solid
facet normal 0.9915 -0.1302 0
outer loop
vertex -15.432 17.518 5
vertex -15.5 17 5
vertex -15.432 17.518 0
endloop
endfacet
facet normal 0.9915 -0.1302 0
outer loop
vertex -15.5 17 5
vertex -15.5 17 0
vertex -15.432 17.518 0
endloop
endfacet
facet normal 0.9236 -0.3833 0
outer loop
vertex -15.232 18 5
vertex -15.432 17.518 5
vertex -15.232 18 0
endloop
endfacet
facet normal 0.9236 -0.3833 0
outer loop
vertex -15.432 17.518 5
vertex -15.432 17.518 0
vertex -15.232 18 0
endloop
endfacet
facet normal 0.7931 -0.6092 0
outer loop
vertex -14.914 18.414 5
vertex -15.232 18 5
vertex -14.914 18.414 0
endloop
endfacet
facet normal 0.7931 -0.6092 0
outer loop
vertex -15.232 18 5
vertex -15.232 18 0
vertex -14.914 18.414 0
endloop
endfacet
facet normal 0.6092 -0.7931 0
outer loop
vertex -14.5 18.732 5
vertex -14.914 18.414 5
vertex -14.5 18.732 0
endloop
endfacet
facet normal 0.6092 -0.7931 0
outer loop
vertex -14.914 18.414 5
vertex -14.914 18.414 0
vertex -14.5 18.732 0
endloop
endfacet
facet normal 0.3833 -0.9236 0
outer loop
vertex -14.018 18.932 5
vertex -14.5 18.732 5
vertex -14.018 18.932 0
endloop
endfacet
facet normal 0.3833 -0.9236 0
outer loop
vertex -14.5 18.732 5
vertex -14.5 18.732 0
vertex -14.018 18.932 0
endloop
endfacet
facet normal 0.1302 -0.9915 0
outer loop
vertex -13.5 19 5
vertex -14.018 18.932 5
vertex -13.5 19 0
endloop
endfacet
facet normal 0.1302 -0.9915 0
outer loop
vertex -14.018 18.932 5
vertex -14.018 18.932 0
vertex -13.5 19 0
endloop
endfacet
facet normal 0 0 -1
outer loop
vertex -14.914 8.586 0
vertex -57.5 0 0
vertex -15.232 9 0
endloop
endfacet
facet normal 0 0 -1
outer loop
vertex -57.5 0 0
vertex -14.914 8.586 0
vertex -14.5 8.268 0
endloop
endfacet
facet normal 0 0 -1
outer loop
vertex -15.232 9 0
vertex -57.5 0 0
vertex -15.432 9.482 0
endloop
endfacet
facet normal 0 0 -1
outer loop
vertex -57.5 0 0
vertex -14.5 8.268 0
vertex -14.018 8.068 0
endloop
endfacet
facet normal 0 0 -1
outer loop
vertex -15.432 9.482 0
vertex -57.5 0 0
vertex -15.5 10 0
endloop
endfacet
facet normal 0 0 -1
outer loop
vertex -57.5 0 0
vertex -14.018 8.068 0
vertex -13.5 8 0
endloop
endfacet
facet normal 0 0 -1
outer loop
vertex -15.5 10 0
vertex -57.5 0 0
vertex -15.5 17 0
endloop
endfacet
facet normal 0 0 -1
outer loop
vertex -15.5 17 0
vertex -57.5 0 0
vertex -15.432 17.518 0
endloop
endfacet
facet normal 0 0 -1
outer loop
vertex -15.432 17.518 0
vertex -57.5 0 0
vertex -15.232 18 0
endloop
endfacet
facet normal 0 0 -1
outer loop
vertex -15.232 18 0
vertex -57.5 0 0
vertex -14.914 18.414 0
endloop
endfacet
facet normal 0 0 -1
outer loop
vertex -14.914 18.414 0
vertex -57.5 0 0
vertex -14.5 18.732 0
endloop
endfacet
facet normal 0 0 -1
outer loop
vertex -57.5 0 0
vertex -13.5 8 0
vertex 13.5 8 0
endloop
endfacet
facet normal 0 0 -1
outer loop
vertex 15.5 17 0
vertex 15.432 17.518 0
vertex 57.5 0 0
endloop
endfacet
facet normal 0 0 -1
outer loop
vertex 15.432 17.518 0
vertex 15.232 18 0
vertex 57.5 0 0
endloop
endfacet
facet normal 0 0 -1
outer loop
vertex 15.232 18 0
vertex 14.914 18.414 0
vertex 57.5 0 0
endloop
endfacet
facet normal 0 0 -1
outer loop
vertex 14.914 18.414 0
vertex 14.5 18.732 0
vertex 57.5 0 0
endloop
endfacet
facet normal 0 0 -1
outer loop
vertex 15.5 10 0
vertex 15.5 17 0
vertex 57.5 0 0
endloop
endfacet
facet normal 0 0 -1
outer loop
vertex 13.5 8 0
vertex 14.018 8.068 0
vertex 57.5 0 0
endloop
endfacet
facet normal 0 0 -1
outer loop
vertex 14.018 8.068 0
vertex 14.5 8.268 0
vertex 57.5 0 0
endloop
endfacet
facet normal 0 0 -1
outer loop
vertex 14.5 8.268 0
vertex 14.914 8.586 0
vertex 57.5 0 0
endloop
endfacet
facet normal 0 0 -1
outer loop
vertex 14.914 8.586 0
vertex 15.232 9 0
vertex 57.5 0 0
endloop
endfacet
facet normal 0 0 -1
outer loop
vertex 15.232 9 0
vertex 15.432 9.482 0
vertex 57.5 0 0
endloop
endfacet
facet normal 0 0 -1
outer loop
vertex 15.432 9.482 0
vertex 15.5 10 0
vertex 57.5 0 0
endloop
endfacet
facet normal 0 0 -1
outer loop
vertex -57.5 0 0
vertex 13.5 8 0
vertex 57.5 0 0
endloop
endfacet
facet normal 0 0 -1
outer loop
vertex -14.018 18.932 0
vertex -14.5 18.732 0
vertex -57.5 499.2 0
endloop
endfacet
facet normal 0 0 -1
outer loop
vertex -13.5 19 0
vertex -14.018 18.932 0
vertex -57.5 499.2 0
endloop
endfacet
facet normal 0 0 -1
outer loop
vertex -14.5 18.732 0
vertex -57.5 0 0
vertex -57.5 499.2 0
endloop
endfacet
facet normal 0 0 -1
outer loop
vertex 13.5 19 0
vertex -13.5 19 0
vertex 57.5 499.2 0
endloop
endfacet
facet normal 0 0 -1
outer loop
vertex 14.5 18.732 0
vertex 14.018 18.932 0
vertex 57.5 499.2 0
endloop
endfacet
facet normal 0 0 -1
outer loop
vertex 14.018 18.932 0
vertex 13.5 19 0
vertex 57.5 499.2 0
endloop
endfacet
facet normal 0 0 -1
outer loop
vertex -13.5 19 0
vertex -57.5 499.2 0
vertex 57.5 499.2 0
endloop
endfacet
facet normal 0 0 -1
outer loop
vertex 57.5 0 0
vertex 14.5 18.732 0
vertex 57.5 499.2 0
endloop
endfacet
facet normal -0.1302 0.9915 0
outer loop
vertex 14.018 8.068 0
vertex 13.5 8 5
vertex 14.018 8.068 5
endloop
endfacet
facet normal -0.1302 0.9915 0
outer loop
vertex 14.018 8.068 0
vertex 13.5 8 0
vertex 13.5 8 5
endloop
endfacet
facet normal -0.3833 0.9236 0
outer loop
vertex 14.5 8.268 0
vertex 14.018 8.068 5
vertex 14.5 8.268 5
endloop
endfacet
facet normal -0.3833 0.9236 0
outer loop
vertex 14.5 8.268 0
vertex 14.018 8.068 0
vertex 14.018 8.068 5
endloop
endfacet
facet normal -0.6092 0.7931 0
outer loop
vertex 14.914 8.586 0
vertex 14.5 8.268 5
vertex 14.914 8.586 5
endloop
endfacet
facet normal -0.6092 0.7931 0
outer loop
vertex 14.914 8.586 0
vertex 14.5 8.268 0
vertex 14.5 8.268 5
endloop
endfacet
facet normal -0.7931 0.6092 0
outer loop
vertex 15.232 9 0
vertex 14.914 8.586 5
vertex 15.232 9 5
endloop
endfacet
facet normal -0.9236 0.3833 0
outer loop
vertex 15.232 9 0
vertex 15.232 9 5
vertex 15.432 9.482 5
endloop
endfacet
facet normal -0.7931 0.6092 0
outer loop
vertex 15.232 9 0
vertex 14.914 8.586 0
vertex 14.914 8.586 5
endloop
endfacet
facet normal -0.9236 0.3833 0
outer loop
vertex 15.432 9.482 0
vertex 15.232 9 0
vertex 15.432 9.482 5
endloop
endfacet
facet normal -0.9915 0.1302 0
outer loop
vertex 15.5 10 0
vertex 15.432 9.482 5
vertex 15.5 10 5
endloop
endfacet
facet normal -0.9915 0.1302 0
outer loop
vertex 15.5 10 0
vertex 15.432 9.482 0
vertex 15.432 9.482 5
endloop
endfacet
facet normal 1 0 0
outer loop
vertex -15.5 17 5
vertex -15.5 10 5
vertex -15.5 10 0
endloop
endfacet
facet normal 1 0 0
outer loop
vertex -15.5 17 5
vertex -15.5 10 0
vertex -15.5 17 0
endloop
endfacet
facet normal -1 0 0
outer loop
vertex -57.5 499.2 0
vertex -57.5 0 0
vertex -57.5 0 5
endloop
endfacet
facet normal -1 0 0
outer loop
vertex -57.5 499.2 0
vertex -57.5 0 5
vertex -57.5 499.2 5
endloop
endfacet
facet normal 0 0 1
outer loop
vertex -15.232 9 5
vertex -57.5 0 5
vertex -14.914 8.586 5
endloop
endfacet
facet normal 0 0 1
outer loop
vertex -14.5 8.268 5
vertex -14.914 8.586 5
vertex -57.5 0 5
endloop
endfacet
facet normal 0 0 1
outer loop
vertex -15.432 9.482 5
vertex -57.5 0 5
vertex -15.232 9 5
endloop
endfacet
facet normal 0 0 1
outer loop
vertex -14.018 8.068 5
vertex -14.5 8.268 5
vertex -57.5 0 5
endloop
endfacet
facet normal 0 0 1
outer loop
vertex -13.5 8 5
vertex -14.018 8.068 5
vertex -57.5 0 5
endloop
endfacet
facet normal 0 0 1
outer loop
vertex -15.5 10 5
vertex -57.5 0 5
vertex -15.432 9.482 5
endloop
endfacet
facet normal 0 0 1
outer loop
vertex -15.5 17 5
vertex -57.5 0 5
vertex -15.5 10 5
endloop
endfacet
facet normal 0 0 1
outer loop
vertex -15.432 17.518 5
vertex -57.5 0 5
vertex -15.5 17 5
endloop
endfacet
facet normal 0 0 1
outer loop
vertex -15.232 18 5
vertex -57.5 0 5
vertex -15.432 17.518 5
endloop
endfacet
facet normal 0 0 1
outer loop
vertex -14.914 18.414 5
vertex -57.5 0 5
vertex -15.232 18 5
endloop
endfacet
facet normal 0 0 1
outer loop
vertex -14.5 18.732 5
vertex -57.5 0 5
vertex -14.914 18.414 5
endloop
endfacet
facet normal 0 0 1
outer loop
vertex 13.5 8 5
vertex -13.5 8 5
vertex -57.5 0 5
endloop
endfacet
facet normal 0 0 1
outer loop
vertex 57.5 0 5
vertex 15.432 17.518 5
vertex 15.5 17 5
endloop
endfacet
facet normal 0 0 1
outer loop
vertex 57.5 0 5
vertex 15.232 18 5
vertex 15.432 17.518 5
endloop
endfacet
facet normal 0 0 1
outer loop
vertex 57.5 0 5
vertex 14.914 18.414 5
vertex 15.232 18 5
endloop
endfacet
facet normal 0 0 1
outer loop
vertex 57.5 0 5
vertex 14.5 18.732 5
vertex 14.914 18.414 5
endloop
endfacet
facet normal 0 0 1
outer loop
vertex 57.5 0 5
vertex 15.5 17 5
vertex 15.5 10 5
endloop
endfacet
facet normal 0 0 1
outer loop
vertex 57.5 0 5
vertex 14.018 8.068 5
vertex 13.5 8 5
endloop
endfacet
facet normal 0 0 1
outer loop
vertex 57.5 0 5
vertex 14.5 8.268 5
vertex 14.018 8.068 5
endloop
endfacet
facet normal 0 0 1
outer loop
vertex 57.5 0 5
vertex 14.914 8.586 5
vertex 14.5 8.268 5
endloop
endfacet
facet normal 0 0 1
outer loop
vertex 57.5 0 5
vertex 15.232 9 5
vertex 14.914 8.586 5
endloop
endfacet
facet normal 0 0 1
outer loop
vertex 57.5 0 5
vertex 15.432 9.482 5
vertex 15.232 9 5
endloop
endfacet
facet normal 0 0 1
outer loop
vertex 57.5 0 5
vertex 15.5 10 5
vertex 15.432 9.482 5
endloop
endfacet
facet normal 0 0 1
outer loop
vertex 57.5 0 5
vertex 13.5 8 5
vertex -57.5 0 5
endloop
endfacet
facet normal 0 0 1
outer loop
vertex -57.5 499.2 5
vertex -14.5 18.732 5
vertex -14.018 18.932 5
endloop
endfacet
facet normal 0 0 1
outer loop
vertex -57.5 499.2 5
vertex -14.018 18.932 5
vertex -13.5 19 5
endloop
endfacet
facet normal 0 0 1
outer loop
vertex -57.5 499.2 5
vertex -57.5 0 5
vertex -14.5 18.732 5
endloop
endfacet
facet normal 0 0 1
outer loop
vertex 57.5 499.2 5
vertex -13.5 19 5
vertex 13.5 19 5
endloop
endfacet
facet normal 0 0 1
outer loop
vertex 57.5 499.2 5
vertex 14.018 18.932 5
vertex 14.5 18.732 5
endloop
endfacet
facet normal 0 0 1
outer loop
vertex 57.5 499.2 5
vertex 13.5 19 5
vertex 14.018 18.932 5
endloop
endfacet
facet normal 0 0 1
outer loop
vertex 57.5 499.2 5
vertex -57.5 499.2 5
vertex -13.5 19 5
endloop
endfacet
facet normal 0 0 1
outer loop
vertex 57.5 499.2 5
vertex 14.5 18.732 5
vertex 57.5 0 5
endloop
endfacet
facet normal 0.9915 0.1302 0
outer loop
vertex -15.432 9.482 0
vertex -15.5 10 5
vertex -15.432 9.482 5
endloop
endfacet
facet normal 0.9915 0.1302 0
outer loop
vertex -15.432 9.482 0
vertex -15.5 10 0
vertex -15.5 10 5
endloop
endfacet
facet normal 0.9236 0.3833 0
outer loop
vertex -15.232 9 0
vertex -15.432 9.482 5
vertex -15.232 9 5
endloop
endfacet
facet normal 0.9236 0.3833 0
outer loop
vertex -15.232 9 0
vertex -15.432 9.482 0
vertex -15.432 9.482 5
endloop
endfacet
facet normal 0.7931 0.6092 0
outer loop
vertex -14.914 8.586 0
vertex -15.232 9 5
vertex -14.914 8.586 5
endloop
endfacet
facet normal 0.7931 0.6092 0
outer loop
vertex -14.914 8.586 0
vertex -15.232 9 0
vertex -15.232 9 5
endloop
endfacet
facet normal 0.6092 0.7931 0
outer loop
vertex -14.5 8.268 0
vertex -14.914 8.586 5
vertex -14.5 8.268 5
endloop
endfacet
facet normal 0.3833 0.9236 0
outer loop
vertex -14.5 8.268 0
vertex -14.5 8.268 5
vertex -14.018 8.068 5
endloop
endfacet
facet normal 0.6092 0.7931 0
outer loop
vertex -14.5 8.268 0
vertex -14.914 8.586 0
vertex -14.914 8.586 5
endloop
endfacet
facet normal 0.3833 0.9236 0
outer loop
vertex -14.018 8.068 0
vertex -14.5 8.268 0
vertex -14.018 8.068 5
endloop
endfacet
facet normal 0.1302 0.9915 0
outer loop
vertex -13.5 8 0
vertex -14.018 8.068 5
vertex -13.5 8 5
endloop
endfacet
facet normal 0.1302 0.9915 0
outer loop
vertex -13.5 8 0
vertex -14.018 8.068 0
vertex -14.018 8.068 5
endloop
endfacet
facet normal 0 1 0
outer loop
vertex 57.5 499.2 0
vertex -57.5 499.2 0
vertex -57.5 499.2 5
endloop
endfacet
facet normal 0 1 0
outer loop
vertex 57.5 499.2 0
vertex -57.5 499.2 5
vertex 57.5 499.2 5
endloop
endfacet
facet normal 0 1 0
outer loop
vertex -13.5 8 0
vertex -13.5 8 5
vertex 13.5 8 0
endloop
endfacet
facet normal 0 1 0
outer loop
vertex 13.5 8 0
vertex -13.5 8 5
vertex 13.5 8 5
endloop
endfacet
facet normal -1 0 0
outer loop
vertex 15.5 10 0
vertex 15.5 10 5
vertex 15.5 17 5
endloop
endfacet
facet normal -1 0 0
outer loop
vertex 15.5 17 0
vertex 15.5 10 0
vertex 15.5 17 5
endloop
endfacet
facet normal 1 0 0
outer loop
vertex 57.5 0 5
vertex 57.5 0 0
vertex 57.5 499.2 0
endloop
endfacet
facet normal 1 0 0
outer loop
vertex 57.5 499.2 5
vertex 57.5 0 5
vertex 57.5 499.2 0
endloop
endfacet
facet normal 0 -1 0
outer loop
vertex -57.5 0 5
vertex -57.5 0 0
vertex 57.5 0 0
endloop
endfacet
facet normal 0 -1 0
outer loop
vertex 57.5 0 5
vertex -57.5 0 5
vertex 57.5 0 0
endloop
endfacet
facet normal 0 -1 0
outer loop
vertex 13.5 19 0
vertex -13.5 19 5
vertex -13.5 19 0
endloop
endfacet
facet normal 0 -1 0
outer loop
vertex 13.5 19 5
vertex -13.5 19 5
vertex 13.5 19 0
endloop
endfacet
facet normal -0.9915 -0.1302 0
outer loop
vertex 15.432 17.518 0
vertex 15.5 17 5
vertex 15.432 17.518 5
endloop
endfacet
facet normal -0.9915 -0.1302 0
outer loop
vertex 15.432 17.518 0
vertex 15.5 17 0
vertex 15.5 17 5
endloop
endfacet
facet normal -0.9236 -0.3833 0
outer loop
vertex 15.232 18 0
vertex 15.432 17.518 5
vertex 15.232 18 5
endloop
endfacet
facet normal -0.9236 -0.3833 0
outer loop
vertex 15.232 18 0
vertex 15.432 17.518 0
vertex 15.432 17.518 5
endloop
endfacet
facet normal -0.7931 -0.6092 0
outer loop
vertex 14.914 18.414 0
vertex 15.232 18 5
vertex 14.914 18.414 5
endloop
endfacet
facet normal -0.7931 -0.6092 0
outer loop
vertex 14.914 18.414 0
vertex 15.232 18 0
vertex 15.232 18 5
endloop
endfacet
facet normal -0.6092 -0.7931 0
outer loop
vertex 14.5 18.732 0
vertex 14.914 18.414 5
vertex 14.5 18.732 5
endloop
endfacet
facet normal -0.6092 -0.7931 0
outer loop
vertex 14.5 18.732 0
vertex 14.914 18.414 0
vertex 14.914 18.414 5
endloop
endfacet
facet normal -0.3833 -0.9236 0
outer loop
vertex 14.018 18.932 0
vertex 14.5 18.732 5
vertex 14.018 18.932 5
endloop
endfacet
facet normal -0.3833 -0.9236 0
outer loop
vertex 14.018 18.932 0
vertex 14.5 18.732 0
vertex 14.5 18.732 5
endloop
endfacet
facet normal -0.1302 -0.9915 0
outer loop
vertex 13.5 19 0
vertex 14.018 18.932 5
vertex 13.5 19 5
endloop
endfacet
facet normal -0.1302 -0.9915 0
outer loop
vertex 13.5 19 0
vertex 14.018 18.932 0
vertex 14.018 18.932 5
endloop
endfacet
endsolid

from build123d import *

# Parameters (mm, degrees)
SKETCH1_W           = 115
SKETCH1_H           = 499.2
BOSS_EXTRUDE1_DEPTH = 5
CUT_EXTRUDE1_REACH  = 504.526
SKETCH2_W           = 31
SKETCH2_H           = 11
FILLET1_R           = 2


with BuildPart() as part:
    # Sketch1 → Boss-Extrude1 (new body)
    with BuildSketch(Plane.XY):
        with Locations((0, 249.6)):
            Rectangle(SKETCH1_W, SKETCH1_H)
    extrude(amount=BOSS_EXTRUDE1_DEPTH)

    # Sketch2 → Cut-Extrude1 (cut, up to next)
    with BuildSketch(Plane.XY.offset(5), mode=Mode.PRIVATE) as cut_extrude1_sk1:
        with Locations((0, 13.5)):
            Rectangle(SKETCH2_W, SKETCH2_H)
    cut_extrude1_tool1 = extrude(cut_extrude1_sk1.sketch, amount=-CUT_EXTRUDE1_REACH, mode=Mode.PRIVATE) & part.part
    add(cut_extrude1_tool1.solids().sort_by_distance((0, 13.5, 5))[0], mode=Mode.SUBTRACT)

    # Fillet1
    fillet1_edges = [part.edges().sort_by_distance(p)[0] for p in [
        (-15.5, 8, 2.5),
        (-15.5, 19, 2.5),
        (15.5, 19, 2.5),
        (15.5, 8, 2.5),
    ]]
    fillet(fillet1_edges, radius=FILLET1_R)


solid = part.part
